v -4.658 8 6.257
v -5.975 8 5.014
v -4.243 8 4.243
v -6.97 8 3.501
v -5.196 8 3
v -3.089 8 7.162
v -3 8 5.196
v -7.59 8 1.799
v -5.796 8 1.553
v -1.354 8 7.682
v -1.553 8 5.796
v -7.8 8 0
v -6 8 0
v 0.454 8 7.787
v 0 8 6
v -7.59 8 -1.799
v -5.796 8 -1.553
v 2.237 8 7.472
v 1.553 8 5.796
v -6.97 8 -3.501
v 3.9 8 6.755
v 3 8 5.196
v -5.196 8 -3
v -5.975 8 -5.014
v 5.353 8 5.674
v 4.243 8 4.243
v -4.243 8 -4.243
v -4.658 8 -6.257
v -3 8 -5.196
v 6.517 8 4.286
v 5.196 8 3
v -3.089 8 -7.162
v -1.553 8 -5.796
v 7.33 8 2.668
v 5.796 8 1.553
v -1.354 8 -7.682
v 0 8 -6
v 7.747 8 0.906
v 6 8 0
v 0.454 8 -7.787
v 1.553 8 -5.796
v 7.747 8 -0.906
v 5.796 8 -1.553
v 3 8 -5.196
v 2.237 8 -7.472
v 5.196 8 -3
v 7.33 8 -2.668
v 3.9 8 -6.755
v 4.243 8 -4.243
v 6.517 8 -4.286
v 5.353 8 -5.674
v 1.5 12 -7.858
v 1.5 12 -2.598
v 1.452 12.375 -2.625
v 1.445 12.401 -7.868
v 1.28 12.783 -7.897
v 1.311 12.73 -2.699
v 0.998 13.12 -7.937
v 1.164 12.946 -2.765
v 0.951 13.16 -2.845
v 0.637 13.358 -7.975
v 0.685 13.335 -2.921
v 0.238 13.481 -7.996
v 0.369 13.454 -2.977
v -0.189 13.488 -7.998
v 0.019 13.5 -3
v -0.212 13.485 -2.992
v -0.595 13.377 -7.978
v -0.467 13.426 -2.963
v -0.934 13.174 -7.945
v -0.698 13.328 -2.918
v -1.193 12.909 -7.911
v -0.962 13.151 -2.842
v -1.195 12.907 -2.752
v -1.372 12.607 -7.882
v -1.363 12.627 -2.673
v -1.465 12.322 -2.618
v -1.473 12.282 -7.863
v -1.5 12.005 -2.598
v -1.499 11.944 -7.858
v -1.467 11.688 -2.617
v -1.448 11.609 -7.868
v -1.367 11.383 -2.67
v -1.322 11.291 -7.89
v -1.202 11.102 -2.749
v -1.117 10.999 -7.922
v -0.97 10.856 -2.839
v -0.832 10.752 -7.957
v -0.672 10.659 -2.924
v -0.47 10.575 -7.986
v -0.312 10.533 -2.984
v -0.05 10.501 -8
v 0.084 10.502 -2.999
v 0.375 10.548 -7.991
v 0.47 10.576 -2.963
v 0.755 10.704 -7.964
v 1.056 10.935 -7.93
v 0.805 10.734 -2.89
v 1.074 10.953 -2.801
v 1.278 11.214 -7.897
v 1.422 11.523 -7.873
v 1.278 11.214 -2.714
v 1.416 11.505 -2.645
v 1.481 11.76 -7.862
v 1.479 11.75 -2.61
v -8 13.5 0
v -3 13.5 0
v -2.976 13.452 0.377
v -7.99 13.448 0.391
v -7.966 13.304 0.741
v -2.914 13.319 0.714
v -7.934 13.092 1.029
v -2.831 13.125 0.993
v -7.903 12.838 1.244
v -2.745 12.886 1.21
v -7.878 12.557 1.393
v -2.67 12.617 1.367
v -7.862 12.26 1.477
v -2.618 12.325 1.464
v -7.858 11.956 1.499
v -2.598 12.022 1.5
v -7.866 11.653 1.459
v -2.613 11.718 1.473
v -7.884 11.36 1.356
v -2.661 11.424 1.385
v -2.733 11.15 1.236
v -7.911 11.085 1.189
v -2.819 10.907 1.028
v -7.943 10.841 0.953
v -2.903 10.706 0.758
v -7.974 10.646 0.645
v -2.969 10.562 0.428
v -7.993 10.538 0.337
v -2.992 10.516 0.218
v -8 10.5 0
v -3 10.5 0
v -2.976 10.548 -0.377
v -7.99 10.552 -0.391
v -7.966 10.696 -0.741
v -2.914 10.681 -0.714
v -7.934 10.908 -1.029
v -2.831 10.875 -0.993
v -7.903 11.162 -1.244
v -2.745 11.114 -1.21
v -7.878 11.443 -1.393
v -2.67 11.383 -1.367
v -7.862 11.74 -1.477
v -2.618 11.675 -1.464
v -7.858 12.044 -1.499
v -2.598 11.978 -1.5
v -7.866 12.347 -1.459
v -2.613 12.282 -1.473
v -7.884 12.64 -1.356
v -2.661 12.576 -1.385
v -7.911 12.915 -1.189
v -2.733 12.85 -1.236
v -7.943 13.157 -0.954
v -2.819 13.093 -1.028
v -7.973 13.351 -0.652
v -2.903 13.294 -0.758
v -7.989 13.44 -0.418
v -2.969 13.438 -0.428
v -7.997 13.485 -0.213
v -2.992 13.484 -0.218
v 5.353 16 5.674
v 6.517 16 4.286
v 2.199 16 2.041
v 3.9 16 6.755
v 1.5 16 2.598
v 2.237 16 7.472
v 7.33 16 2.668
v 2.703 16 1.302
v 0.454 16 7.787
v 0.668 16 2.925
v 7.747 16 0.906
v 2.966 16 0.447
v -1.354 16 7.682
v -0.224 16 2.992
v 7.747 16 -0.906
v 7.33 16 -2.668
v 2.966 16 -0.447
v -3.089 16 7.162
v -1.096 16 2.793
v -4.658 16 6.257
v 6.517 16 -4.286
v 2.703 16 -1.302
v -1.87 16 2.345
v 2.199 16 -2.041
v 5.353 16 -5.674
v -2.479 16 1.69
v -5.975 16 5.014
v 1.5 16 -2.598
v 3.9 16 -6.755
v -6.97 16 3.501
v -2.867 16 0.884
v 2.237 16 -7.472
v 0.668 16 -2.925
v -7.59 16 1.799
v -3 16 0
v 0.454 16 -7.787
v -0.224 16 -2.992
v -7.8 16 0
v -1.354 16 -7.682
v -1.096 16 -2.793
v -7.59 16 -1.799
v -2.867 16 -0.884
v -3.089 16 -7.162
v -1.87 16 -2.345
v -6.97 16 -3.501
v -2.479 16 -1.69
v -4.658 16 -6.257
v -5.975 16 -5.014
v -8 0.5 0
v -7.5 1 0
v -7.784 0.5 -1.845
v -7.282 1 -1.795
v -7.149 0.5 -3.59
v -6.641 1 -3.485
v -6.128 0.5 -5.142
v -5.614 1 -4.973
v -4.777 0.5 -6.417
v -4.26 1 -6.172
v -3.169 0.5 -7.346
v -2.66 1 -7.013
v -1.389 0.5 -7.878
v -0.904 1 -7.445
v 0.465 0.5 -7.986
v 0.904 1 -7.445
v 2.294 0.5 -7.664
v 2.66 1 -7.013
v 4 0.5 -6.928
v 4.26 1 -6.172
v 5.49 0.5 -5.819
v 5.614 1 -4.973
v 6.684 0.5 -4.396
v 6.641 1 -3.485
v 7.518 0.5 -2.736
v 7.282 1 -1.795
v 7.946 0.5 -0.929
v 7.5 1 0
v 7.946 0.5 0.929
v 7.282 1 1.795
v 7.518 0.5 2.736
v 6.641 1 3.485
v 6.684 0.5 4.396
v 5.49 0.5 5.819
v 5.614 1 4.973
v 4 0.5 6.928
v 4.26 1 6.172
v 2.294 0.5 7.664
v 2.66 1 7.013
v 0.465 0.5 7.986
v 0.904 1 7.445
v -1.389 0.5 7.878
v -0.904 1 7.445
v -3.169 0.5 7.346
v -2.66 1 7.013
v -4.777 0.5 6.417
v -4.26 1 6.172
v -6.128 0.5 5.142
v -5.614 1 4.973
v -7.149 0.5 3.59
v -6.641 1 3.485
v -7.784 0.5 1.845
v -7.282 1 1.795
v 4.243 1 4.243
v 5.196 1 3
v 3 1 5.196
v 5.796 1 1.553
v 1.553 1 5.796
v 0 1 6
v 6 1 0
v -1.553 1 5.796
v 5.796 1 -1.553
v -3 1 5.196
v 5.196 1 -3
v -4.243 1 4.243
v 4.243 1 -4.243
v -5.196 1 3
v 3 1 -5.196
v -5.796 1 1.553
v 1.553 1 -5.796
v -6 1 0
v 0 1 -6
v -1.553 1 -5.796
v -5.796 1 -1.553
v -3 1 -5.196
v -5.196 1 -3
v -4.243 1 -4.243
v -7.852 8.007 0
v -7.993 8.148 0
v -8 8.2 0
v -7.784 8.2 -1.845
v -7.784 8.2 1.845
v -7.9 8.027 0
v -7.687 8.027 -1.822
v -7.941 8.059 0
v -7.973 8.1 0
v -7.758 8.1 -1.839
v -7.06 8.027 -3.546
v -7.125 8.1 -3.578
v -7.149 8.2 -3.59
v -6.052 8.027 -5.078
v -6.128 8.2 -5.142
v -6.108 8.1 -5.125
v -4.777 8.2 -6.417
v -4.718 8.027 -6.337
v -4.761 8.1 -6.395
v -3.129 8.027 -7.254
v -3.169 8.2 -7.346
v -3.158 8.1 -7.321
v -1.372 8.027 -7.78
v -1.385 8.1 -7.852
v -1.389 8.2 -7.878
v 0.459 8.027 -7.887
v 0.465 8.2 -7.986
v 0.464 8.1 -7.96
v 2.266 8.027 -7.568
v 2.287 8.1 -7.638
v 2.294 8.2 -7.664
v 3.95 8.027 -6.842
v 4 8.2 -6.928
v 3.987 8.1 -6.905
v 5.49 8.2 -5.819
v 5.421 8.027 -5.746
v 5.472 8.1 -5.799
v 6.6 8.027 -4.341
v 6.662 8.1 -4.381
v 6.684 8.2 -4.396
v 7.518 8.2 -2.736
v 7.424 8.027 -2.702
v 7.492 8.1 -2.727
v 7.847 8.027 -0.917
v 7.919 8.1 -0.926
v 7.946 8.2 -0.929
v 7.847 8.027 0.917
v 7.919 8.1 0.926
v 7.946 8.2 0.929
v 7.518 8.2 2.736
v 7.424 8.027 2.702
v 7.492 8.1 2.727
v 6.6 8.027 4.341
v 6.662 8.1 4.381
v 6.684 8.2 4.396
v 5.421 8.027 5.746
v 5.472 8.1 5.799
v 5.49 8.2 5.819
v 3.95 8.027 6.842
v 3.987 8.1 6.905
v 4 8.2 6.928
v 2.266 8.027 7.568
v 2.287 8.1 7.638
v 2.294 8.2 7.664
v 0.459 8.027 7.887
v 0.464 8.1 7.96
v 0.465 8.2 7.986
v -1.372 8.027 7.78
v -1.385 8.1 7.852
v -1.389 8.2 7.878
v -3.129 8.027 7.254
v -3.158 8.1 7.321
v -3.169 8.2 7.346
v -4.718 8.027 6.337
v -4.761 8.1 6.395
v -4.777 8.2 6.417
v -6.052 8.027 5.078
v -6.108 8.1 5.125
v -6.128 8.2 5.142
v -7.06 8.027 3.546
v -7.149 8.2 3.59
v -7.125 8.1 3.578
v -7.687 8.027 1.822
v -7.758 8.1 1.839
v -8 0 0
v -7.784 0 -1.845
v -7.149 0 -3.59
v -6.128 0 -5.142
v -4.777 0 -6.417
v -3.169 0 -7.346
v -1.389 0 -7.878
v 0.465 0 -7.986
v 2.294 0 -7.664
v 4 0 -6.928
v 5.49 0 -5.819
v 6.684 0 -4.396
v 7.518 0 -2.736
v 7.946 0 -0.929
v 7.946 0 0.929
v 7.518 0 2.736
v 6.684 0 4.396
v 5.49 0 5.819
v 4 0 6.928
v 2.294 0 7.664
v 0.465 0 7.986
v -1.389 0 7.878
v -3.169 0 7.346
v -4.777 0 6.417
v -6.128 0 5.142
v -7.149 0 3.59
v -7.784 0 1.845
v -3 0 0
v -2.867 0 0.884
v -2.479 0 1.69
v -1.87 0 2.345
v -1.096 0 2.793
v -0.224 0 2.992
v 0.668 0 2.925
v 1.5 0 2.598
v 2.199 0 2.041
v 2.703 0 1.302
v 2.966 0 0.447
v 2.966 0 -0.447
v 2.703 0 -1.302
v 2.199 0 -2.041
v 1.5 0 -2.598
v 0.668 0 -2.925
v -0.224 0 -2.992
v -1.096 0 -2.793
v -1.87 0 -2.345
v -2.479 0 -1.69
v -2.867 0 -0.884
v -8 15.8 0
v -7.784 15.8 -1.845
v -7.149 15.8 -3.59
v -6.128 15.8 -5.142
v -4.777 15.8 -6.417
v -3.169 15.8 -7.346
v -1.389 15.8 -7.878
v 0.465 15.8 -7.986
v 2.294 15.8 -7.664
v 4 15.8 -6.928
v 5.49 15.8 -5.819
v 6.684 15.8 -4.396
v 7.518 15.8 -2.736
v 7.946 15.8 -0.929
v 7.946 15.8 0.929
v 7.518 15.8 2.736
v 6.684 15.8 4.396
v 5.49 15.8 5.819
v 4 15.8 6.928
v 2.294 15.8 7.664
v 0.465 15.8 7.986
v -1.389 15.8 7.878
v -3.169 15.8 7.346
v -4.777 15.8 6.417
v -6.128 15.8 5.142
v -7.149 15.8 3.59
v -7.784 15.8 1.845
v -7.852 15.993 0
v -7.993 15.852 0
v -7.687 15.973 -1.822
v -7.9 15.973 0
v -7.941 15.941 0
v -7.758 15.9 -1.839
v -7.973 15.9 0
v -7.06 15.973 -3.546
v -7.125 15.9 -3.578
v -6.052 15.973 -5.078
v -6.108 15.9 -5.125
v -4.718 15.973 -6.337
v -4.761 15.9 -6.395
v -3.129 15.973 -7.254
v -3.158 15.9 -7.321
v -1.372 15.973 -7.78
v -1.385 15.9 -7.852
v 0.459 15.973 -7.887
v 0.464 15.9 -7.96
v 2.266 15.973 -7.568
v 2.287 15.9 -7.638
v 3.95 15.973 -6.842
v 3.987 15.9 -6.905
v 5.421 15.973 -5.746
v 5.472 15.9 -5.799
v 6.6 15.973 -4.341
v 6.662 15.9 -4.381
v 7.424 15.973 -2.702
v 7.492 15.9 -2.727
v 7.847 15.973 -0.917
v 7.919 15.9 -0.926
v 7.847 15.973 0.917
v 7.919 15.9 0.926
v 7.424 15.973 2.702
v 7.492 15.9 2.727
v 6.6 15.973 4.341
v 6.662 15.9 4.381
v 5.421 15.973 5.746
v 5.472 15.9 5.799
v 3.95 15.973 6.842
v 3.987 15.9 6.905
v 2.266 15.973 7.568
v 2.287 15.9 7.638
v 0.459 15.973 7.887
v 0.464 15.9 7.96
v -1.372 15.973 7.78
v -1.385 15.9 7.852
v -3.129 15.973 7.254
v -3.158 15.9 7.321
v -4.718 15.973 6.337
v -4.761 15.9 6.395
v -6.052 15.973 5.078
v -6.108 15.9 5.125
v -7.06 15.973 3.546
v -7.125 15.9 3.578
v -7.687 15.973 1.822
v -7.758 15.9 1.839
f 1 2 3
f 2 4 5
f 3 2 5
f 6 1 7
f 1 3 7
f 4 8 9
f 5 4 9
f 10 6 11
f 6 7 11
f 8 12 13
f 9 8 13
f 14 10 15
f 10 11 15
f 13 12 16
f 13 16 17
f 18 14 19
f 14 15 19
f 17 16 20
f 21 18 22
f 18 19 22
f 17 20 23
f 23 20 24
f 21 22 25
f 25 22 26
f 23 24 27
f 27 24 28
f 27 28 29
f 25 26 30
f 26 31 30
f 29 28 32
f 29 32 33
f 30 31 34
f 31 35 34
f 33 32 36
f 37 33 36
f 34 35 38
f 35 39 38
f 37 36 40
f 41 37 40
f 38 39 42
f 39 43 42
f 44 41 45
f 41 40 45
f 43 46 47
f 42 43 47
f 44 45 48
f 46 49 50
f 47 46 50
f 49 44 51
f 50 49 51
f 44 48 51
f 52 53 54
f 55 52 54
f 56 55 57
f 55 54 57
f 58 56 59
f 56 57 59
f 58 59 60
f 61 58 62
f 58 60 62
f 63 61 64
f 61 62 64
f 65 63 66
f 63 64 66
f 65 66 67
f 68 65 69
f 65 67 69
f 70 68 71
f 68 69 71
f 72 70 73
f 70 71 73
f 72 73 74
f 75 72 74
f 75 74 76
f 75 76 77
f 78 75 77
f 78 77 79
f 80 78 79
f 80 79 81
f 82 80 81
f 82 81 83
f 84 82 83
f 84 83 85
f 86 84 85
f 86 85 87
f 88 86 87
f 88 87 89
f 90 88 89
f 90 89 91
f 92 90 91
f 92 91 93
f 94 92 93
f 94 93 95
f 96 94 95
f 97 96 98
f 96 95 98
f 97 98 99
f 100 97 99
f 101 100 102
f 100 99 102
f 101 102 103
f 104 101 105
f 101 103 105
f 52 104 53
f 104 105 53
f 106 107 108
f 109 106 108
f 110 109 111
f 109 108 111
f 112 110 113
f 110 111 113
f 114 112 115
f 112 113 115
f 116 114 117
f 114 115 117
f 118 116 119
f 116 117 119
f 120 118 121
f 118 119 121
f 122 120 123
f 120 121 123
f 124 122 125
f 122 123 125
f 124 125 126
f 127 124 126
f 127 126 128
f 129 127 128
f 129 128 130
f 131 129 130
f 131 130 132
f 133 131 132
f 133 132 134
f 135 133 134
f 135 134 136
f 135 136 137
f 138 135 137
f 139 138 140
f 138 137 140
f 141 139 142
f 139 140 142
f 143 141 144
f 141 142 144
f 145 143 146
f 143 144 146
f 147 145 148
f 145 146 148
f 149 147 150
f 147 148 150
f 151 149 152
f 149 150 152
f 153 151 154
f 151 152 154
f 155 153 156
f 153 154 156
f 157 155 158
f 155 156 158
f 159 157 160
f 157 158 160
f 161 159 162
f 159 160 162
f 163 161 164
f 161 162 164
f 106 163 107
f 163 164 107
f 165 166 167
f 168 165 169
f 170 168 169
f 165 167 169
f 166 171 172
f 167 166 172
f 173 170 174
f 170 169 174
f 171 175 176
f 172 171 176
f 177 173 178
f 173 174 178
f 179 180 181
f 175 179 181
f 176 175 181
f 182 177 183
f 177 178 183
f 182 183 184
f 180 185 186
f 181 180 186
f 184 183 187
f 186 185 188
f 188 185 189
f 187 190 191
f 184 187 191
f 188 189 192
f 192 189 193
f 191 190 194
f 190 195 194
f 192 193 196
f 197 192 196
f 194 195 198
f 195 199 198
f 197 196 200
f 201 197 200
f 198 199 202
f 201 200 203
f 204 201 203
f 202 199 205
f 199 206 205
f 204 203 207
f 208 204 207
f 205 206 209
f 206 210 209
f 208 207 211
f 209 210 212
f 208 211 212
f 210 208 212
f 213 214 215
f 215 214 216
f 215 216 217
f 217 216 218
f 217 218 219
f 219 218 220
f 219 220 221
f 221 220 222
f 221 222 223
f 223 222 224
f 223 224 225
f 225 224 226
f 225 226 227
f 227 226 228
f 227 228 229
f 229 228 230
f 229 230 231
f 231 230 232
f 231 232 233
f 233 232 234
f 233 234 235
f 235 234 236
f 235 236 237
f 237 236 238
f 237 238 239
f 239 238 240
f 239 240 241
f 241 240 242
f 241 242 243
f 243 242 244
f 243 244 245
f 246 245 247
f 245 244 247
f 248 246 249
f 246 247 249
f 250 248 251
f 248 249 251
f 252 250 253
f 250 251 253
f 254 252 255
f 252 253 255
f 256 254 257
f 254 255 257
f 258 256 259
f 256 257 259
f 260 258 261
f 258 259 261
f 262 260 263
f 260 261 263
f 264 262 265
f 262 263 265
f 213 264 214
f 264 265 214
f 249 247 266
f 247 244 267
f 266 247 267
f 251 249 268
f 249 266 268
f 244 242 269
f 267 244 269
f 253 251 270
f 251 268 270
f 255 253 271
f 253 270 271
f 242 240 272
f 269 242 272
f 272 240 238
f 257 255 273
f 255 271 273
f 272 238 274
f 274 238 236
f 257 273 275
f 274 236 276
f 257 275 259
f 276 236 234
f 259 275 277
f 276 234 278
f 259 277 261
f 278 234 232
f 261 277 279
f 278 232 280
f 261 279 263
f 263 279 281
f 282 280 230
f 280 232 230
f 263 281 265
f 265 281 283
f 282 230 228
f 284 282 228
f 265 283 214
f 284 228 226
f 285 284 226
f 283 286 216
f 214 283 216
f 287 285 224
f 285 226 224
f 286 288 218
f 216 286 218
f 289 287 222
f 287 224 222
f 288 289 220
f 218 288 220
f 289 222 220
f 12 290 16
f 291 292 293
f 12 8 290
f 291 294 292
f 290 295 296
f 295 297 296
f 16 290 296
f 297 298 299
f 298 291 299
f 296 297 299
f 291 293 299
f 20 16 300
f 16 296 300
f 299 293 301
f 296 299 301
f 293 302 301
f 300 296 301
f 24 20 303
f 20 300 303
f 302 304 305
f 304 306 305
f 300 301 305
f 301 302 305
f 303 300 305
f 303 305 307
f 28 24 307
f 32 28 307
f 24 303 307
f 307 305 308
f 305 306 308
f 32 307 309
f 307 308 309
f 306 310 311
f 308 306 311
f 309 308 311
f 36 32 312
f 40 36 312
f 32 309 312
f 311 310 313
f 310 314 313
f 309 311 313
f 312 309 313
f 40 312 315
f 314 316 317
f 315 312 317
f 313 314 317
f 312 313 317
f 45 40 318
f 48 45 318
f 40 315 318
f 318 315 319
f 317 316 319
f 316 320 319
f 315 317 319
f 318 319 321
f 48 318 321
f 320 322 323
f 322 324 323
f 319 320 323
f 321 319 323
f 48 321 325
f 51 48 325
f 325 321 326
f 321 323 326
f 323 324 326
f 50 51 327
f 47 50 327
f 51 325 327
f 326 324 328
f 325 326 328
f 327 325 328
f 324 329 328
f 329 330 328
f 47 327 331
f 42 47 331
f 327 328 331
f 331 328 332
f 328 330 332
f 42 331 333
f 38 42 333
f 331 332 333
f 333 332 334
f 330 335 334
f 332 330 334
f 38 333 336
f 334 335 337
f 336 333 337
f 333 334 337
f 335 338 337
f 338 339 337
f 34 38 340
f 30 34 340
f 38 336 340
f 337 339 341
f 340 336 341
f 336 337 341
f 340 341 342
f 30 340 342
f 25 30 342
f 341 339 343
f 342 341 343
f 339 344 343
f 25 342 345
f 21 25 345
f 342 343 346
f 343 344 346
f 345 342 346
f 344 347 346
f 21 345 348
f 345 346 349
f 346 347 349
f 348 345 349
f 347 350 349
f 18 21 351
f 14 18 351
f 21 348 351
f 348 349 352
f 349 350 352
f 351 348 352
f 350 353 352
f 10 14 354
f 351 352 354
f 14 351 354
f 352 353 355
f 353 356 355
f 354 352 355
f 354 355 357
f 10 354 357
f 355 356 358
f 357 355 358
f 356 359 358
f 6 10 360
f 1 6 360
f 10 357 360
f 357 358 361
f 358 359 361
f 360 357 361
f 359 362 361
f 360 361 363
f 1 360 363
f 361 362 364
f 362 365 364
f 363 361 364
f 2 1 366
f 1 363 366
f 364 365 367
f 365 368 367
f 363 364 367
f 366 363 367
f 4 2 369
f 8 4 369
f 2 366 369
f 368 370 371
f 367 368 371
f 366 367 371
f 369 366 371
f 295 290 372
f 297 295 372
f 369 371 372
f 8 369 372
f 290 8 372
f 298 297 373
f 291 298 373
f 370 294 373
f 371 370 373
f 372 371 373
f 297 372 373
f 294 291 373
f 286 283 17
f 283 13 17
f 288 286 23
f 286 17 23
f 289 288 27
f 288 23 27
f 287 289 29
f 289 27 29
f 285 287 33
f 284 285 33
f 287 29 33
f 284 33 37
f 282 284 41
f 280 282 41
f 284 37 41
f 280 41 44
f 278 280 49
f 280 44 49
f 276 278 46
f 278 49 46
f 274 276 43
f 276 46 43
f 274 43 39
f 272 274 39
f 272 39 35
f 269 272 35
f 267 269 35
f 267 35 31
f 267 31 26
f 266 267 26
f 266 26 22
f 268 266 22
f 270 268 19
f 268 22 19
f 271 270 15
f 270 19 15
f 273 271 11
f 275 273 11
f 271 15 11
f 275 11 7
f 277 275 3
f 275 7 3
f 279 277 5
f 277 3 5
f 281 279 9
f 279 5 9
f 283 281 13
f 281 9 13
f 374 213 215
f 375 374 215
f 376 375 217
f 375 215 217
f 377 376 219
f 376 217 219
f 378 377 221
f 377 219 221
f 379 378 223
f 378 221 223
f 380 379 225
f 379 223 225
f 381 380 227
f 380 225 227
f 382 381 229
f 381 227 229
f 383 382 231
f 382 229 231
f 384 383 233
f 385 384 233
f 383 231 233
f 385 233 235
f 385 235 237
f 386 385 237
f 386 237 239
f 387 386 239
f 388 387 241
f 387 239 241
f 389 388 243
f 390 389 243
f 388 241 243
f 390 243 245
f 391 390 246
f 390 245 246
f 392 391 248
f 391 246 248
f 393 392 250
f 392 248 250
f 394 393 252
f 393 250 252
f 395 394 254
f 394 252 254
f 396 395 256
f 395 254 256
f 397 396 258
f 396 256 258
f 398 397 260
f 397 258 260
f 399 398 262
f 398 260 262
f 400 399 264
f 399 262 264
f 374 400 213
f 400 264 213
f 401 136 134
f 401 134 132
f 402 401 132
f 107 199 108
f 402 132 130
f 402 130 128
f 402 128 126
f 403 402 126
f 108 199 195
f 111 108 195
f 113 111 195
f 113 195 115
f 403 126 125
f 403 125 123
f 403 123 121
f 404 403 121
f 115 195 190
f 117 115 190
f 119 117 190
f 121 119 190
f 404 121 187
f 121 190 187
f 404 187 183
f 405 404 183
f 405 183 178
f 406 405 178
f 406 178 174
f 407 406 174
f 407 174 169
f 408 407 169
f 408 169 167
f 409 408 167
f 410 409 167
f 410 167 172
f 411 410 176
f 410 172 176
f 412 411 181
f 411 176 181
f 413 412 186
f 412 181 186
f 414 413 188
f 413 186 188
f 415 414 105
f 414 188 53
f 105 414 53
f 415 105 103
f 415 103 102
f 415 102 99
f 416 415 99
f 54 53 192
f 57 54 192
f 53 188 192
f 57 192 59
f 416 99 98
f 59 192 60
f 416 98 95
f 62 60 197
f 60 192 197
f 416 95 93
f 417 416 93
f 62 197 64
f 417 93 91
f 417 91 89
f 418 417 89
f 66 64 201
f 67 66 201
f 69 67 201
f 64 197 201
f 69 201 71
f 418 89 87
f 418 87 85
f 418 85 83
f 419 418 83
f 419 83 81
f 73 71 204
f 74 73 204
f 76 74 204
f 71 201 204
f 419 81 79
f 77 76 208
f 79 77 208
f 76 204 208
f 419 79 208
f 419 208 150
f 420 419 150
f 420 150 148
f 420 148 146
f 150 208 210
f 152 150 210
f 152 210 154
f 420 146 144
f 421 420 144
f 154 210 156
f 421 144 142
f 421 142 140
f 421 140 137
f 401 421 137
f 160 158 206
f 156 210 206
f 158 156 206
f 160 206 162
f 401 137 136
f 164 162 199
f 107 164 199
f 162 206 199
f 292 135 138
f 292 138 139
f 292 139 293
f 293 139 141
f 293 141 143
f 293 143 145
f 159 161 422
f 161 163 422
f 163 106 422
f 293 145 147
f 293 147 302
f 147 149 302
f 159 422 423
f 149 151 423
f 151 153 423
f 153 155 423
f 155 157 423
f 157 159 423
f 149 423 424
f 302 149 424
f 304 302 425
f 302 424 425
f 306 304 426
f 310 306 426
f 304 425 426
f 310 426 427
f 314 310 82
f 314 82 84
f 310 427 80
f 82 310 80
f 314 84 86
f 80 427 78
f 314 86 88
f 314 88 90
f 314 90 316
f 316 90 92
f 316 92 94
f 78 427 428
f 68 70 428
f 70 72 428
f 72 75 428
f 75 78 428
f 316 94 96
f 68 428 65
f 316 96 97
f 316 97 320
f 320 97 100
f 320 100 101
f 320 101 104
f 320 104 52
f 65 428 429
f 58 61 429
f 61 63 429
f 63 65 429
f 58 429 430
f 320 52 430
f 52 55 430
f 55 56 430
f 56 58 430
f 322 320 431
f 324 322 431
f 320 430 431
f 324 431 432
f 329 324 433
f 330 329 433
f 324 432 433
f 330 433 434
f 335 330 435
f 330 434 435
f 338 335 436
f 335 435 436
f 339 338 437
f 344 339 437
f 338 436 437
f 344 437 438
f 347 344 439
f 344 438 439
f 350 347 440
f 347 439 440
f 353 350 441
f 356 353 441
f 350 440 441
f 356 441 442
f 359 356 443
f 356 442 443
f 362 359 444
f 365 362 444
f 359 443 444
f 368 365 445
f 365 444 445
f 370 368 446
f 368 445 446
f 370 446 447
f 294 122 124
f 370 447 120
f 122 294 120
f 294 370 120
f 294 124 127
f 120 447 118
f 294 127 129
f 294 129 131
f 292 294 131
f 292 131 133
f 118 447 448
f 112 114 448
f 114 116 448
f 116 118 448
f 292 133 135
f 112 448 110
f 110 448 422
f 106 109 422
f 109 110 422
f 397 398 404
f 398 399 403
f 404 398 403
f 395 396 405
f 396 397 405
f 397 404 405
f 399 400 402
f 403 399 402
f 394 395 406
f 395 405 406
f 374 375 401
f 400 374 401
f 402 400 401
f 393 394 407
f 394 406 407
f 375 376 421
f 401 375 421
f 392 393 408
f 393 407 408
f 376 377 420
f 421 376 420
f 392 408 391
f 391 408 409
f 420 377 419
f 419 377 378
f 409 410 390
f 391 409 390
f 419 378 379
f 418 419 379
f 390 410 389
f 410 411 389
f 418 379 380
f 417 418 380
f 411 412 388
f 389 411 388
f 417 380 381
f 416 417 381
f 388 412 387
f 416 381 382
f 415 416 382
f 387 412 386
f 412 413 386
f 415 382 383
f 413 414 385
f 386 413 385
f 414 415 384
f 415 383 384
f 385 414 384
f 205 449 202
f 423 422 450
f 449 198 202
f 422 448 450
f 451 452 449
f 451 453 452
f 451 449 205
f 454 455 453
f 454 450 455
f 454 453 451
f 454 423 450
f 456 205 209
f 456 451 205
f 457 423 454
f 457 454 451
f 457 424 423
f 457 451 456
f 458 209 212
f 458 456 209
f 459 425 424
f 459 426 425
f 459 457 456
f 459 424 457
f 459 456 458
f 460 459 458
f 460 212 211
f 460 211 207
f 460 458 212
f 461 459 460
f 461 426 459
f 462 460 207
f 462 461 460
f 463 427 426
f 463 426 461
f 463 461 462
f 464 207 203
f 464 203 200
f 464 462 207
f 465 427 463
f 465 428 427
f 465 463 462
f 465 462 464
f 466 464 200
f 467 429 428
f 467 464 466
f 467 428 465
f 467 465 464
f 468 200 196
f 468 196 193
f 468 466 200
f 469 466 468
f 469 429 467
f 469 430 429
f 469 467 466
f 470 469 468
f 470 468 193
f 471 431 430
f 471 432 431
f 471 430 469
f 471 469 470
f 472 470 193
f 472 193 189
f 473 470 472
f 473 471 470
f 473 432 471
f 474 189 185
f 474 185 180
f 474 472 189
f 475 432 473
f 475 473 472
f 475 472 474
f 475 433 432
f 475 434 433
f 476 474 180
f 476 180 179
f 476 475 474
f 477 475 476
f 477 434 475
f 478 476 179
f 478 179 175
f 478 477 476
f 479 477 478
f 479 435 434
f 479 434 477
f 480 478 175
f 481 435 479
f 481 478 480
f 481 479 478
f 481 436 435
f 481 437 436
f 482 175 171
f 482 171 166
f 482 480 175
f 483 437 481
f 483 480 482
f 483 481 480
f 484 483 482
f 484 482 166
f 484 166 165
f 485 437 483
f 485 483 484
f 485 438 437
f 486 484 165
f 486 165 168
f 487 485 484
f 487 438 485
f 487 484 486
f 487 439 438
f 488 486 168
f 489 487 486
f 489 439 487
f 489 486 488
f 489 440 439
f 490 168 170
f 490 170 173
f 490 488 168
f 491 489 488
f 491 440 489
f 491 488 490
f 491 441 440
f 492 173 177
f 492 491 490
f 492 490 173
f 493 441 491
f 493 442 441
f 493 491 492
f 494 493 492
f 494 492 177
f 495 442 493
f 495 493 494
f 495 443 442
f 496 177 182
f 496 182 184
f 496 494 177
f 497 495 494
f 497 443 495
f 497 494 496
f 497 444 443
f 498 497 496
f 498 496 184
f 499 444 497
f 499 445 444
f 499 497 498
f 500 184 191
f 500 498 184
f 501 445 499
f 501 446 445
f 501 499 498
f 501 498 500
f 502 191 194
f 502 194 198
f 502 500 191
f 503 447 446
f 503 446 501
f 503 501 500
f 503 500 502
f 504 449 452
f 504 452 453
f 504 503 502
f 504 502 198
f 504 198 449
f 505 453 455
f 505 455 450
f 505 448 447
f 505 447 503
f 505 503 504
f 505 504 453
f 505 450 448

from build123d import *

# Parameters (mm, degrees)
CHAMFER1_SIZE      = 0.5
SKETCH2_R          = 3
CUT_EXTRUDE1_DEPTH = 20.595917942
SKETCH3_R          = 1.5
CUT_EXTRUDE2_DEPTH = 20.595917942
SKETCH4_R          = 1.5
CUT_EXTRUDE3_DEPTH = 20.595918106
FILLET1_R          = 0.2


with BuildPart() as part:
    # Sketch1 → Revolve1 (revolve)
    with BuildSketch(Plane.XY, mode=Mode.PRIVATE) as revolve1_sk:
        Polygon((0, 0), (8, 0), (8, 1), (6, 1), (6, 8), (8, 8), (8, 16), (0, 16), align=None)
    revolve(revolve1_sk.sketch.rotate(Axis((0, 16, 0), (0, -1, 0)), 180), axis=Axis((0, 16, 0), (0, -1, 0)))

    # Chamfer1
    chamfer1_edges = [part.edges().sort_by_distance(p)[0] for p in [
        (8, 1, 0),
    ]]
    chamfer(chamfer1_edges, length=CHAMFER1_SIZE)

    # Sketch2 → Cut-Extrude1 (cut, through all)
    with BuildSketch(Plane(origin=(0, 16, 0), x_dir=(1, 0, 0), z_dir=(0, 1, 0))):
        with Locations(Location((0, 0, 0), (0, 0, 180))):
            Circle(SKETCH2_R)
    extrude(amount=-CUT_EXTRUDE1_DEPTH, mode=Mode.SUBTRACT)

    # Sketch3 → Cut-Extrude2 (cut, through all)
    with BuildSketch(Plane(origin=(0, 0, 0), x_dir=(0, 0, -1), z_dir=(1, 0, 0))):
        with Locations(Location((0, 12, 0), (0, 0, 89.999999999))):
            Circle(SKETCH3_R)
    extrude(amount=-CUT_EXTRUDE2_DEPTH, mode=Mode.SUBTRACT)

    # Sketch4 → Cut-Extrude3 (cut, through all)
    with BuildSketch(Plane.XY):
        with Locations((0, 12)):
            Circle(SKETCH4_R)
    extrude(amount=-CUT_EXTRUDE3_DEPTH, mode=Mode.SUBTRACT)

    # Fillet1
    fillet1_edges = [part.edges().sort_by_distance(p)[0] for p in [
        (8, 16, 0),
        (8, 8, 0),
    ]]
    fillet(fillet1_edges, radius=FILLET1_R)


solid = part.part
